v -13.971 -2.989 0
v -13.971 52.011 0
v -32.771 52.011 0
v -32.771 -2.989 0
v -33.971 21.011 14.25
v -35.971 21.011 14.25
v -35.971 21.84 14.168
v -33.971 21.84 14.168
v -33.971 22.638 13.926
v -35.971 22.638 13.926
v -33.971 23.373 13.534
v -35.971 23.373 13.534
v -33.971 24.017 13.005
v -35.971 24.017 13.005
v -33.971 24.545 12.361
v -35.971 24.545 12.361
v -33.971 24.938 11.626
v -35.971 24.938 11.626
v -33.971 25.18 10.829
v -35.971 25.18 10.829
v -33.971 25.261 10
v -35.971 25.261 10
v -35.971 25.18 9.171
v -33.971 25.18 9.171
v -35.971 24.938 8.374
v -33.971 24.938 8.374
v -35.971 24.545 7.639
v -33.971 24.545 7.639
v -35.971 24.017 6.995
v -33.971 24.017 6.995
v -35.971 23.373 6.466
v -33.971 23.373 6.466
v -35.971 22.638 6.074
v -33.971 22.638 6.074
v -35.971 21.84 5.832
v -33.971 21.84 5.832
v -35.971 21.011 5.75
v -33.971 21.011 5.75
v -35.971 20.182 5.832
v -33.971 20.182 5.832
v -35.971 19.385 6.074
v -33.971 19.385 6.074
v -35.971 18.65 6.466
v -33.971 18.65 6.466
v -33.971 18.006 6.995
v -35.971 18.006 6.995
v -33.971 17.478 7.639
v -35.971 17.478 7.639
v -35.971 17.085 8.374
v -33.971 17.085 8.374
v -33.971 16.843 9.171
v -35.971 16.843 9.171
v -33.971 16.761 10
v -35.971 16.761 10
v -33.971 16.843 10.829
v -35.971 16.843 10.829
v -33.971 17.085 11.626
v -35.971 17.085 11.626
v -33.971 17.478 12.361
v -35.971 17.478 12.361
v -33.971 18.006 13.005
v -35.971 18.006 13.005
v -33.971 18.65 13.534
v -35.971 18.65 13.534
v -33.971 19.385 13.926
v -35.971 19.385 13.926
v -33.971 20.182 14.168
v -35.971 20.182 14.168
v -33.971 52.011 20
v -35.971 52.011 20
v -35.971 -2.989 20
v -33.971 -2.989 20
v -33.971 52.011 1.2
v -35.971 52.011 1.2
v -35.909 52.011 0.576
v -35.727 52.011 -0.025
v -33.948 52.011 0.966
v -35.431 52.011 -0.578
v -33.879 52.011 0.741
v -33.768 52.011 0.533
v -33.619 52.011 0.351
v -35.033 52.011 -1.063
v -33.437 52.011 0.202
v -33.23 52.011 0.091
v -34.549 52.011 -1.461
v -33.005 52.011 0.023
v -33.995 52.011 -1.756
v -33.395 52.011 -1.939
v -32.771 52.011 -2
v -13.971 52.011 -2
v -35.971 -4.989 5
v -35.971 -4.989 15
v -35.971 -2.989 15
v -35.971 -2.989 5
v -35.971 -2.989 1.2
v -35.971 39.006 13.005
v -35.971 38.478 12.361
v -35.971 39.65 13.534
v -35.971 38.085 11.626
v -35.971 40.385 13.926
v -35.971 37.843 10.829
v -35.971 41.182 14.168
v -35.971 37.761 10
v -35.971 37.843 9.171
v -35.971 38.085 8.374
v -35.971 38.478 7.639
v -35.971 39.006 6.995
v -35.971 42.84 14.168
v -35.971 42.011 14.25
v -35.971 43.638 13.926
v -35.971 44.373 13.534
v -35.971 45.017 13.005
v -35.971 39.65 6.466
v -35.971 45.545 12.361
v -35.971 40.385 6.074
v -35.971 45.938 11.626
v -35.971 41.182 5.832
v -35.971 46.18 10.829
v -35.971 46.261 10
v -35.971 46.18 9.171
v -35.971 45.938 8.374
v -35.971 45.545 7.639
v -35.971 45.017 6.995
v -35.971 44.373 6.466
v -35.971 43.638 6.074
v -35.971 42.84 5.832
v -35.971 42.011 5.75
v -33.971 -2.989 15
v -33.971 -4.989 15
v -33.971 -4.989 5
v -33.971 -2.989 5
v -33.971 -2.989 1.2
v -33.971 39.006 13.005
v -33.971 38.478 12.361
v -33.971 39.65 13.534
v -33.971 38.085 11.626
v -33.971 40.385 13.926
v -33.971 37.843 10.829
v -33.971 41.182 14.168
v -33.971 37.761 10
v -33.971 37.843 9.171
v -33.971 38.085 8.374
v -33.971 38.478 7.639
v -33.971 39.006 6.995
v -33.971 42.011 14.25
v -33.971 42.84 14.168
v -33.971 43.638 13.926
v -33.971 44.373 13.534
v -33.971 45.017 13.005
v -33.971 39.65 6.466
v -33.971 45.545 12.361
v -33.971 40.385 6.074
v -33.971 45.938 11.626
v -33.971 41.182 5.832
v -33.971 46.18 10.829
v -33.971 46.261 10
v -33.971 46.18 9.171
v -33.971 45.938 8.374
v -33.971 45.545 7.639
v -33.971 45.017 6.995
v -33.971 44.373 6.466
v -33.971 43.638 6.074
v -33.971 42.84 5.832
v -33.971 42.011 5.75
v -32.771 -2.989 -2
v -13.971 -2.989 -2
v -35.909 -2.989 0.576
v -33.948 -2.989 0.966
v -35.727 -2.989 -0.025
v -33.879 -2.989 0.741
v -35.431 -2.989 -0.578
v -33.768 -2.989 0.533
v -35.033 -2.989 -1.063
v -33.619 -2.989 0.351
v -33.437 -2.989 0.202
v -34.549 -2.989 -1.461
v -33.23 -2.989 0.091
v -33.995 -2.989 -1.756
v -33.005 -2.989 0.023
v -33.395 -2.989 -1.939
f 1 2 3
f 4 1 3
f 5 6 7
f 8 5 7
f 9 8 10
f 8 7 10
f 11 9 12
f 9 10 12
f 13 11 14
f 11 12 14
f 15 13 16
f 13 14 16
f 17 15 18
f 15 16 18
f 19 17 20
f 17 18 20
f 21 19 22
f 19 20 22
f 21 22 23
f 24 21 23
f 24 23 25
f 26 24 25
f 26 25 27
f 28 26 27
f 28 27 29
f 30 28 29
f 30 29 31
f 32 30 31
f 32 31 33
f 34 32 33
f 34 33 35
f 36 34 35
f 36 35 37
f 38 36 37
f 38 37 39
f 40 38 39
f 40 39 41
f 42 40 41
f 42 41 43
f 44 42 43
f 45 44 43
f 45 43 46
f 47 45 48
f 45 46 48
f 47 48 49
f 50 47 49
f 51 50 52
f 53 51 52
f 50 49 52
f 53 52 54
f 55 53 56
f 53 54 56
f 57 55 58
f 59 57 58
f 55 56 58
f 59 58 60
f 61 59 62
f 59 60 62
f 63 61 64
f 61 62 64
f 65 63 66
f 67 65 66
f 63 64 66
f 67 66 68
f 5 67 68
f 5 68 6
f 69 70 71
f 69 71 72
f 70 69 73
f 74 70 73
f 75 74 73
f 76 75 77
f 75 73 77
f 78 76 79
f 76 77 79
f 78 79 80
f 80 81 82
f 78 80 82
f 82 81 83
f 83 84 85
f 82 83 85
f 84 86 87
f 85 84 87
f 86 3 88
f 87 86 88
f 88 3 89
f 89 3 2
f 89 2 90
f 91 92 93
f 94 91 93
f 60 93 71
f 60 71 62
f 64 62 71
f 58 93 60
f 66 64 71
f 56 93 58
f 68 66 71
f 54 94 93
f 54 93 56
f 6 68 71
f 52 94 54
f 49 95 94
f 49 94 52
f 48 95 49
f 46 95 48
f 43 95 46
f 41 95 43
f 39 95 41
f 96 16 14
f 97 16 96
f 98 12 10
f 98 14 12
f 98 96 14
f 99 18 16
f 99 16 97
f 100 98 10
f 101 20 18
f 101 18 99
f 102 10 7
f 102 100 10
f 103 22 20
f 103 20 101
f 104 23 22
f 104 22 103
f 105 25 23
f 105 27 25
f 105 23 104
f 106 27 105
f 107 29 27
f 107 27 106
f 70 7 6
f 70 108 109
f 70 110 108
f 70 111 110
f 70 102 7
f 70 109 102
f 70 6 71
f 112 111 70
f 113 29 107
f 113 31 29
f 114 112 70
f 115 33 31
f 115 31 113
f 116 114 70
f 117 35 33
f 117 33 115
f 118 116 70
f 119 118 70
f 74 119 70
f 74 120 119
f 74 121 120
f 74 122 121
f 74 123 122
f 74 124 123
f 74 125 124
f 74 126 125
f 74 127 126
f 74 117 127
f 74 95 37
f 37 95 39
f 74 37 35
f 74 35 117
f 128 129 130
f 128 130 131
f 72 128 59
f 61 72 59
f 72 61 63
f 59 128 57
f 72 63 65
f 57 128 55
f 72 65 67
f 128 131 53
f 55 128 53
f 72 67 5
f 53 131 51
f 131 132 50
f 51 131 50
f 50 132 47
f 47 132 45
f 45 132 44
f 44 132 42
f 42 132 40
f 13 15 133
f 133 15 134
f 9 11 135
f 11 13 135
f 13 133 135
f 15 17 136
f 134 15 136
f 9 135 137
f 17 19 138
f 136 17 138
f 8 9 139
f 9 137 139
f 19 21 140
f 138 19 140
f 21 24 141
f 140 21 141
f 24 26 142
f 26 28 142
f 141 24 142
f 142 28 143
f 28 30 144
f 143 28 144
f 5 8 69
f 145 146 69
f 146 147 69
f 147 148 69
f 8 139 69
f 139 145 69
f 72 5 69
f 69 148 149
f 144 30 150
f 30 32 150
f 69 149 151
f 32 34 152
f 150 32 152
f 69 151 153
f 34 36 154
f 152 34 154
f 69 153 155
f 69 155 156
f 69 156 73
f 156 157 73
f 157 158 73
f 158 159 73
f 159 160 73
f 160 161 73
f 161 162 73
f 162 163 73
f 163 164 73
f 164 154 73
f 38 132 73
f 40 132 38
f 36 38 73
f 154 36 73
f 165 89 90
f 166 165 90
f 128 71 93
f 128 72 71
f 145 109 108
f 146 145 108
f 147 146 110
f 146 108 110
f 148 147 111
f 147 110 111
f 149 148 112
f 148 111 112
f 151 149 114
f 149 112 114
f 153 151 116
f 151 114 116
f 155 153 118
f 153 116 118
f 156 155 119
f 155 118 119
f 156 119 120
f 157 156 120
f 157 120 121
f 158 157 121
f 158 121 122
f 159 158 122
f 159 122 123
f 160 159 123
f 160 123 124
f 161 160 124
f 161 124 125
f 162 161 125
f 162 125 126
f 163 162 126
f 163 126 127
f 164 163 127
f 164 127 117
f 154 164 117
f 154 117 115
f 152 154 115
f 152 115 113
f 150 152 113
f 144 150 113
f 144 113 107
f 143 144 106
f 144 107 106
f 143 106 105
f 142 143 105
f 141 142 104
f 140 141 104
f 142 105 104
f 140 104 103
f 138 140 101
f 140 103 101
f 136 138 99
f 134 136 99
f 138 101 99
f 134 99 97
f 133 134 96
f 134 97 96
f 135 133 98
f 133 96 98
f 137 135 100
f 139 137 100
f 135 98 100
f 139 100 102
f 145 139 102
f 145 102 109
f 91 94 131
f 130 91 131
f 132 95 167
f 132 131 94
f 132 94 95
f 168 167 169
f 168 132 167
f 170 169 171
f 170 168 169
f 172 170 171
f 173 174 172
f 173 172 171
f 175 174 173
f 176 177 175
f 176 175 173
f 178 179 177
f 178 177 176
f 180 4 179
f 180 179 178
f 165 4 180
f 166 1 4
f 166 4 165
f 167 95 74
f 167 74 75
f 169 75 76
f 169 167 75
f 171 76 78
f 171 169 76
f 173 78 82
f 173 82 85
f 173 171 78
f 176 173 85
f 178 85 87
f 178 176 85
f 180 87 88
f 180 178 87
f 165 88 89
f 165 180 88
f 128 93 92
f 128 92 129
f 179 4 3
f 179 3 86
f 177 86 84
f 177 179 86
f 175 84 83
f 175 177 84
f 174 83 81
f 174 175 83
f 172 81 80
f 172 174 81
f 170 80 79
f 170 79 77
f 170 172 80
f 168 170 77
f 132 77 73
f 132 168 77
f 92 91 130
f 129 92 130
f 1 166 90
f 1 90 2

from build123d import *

# Parameters (mm, degrees)
SKETCH_1_W                       = 2
SKETCH_1_H                       = 55
SM_BASE_FLANGE_1_DEPTH           = 20
SM_EDGE_FLANGE_1_STRIP_W         = 10.4
SM_EDGE_FLANGE_1_STRIP_H         = 2
SM_EDGE_FLANGE_1_STRIP_CUT_DEPTH = 55
SM_EDGE_FLANGE_1_DEPTH           = 55
SKETCH_6_W                       = 2
SKETCH_6_H                       = 10
EXTRUDE_1_DEPTH                  = 2
SKETCH_8_R                       = 4.25
CUT_EXTRUDE_2_DEPTH              = 5


# Sheet-metal steps are written as plain solids
with BuildPart() as part:
    # Sketch 1 → Базовая кромка1 (new body)
    with BuildSketch(Plane.XY):
        with Locations((-34.970714213, 24.511351052)):
            Rectangle(SKETCH_1_W, SKETCH_1_H)
    extrude(amount=SM_BASE_FLANGE_1_DEPTH)

    # Ребро-кромка1 strip (across the edge) → Ребро-кромка1 strip cut (cut)
    with BuildSketch(Plane(origin=(-33.970714213, -2.988648948, 0), x_dir=(0, 0, 1), z_dir=(0, 1, 0))):
        with Locations((-4, -1)):
            Rectangle(SM_EDGE_FLANGE_1_STRIP_W, SM_EDGE_FLANGE_1_STRIP_H)
    extrude(amount=SM_EDGE_FLANGE_1_STRIP_CUT_DEPTH, mode=Mode.SUBTRACT)

    # Ребро-кромка1 section (across the edge) → Ребро-кромка1 (add)
    with BuildSketch(Plane(origin=(-33.970714213, -2.988648948, 0), x_dir=(0, 0, 1), z_dir=(0, 1, 0))):
        with BuildLine():
            Line((-2, 1.2), (-2, 20))
            Line((-2, 20), (0, 20))
            Line((0, 20), (0, 1.2))
            ThreePointArc((0, 1.2), (0.351471863, 0.351471863), (1.2, 0))
            Line((1.2, 0), (1.2, -2))
            ThreePointArc((1.2, -2), (-1.0627417, -1.0627417), (-2, 1.2))
        make_face()
    extrude(amount=SM_EDGE_FLANGE_1_DEPTH)

    # Эскиз6 → Бобышка-Вытянуть1 (add)
    with BuildSketch(Plane.XZ.offset(2.988648948)):
        with Locations((-34.970714213, 10)):
            Rectangle(SKETCH_6_W, SKETCH_6_H)
    extrude(amount=EXTRUDE_1_DEPTH)

    # Эскиз8 → Вырез-Вытянуть2 (cut)
    with BuildSketch(Plane.ZY.offset(35.970714213)):
        with Locations((10, 42.011351052)):
            Circle(SKETCH_8_R)
        with Locations((10, 21.011351052)):
            Circle(SKETCH_8_R)
    extrude(amount=-CUT_EXTRUDE_2_DEPTH, mode=Mode.SUBTRACT)


solid = part.part
